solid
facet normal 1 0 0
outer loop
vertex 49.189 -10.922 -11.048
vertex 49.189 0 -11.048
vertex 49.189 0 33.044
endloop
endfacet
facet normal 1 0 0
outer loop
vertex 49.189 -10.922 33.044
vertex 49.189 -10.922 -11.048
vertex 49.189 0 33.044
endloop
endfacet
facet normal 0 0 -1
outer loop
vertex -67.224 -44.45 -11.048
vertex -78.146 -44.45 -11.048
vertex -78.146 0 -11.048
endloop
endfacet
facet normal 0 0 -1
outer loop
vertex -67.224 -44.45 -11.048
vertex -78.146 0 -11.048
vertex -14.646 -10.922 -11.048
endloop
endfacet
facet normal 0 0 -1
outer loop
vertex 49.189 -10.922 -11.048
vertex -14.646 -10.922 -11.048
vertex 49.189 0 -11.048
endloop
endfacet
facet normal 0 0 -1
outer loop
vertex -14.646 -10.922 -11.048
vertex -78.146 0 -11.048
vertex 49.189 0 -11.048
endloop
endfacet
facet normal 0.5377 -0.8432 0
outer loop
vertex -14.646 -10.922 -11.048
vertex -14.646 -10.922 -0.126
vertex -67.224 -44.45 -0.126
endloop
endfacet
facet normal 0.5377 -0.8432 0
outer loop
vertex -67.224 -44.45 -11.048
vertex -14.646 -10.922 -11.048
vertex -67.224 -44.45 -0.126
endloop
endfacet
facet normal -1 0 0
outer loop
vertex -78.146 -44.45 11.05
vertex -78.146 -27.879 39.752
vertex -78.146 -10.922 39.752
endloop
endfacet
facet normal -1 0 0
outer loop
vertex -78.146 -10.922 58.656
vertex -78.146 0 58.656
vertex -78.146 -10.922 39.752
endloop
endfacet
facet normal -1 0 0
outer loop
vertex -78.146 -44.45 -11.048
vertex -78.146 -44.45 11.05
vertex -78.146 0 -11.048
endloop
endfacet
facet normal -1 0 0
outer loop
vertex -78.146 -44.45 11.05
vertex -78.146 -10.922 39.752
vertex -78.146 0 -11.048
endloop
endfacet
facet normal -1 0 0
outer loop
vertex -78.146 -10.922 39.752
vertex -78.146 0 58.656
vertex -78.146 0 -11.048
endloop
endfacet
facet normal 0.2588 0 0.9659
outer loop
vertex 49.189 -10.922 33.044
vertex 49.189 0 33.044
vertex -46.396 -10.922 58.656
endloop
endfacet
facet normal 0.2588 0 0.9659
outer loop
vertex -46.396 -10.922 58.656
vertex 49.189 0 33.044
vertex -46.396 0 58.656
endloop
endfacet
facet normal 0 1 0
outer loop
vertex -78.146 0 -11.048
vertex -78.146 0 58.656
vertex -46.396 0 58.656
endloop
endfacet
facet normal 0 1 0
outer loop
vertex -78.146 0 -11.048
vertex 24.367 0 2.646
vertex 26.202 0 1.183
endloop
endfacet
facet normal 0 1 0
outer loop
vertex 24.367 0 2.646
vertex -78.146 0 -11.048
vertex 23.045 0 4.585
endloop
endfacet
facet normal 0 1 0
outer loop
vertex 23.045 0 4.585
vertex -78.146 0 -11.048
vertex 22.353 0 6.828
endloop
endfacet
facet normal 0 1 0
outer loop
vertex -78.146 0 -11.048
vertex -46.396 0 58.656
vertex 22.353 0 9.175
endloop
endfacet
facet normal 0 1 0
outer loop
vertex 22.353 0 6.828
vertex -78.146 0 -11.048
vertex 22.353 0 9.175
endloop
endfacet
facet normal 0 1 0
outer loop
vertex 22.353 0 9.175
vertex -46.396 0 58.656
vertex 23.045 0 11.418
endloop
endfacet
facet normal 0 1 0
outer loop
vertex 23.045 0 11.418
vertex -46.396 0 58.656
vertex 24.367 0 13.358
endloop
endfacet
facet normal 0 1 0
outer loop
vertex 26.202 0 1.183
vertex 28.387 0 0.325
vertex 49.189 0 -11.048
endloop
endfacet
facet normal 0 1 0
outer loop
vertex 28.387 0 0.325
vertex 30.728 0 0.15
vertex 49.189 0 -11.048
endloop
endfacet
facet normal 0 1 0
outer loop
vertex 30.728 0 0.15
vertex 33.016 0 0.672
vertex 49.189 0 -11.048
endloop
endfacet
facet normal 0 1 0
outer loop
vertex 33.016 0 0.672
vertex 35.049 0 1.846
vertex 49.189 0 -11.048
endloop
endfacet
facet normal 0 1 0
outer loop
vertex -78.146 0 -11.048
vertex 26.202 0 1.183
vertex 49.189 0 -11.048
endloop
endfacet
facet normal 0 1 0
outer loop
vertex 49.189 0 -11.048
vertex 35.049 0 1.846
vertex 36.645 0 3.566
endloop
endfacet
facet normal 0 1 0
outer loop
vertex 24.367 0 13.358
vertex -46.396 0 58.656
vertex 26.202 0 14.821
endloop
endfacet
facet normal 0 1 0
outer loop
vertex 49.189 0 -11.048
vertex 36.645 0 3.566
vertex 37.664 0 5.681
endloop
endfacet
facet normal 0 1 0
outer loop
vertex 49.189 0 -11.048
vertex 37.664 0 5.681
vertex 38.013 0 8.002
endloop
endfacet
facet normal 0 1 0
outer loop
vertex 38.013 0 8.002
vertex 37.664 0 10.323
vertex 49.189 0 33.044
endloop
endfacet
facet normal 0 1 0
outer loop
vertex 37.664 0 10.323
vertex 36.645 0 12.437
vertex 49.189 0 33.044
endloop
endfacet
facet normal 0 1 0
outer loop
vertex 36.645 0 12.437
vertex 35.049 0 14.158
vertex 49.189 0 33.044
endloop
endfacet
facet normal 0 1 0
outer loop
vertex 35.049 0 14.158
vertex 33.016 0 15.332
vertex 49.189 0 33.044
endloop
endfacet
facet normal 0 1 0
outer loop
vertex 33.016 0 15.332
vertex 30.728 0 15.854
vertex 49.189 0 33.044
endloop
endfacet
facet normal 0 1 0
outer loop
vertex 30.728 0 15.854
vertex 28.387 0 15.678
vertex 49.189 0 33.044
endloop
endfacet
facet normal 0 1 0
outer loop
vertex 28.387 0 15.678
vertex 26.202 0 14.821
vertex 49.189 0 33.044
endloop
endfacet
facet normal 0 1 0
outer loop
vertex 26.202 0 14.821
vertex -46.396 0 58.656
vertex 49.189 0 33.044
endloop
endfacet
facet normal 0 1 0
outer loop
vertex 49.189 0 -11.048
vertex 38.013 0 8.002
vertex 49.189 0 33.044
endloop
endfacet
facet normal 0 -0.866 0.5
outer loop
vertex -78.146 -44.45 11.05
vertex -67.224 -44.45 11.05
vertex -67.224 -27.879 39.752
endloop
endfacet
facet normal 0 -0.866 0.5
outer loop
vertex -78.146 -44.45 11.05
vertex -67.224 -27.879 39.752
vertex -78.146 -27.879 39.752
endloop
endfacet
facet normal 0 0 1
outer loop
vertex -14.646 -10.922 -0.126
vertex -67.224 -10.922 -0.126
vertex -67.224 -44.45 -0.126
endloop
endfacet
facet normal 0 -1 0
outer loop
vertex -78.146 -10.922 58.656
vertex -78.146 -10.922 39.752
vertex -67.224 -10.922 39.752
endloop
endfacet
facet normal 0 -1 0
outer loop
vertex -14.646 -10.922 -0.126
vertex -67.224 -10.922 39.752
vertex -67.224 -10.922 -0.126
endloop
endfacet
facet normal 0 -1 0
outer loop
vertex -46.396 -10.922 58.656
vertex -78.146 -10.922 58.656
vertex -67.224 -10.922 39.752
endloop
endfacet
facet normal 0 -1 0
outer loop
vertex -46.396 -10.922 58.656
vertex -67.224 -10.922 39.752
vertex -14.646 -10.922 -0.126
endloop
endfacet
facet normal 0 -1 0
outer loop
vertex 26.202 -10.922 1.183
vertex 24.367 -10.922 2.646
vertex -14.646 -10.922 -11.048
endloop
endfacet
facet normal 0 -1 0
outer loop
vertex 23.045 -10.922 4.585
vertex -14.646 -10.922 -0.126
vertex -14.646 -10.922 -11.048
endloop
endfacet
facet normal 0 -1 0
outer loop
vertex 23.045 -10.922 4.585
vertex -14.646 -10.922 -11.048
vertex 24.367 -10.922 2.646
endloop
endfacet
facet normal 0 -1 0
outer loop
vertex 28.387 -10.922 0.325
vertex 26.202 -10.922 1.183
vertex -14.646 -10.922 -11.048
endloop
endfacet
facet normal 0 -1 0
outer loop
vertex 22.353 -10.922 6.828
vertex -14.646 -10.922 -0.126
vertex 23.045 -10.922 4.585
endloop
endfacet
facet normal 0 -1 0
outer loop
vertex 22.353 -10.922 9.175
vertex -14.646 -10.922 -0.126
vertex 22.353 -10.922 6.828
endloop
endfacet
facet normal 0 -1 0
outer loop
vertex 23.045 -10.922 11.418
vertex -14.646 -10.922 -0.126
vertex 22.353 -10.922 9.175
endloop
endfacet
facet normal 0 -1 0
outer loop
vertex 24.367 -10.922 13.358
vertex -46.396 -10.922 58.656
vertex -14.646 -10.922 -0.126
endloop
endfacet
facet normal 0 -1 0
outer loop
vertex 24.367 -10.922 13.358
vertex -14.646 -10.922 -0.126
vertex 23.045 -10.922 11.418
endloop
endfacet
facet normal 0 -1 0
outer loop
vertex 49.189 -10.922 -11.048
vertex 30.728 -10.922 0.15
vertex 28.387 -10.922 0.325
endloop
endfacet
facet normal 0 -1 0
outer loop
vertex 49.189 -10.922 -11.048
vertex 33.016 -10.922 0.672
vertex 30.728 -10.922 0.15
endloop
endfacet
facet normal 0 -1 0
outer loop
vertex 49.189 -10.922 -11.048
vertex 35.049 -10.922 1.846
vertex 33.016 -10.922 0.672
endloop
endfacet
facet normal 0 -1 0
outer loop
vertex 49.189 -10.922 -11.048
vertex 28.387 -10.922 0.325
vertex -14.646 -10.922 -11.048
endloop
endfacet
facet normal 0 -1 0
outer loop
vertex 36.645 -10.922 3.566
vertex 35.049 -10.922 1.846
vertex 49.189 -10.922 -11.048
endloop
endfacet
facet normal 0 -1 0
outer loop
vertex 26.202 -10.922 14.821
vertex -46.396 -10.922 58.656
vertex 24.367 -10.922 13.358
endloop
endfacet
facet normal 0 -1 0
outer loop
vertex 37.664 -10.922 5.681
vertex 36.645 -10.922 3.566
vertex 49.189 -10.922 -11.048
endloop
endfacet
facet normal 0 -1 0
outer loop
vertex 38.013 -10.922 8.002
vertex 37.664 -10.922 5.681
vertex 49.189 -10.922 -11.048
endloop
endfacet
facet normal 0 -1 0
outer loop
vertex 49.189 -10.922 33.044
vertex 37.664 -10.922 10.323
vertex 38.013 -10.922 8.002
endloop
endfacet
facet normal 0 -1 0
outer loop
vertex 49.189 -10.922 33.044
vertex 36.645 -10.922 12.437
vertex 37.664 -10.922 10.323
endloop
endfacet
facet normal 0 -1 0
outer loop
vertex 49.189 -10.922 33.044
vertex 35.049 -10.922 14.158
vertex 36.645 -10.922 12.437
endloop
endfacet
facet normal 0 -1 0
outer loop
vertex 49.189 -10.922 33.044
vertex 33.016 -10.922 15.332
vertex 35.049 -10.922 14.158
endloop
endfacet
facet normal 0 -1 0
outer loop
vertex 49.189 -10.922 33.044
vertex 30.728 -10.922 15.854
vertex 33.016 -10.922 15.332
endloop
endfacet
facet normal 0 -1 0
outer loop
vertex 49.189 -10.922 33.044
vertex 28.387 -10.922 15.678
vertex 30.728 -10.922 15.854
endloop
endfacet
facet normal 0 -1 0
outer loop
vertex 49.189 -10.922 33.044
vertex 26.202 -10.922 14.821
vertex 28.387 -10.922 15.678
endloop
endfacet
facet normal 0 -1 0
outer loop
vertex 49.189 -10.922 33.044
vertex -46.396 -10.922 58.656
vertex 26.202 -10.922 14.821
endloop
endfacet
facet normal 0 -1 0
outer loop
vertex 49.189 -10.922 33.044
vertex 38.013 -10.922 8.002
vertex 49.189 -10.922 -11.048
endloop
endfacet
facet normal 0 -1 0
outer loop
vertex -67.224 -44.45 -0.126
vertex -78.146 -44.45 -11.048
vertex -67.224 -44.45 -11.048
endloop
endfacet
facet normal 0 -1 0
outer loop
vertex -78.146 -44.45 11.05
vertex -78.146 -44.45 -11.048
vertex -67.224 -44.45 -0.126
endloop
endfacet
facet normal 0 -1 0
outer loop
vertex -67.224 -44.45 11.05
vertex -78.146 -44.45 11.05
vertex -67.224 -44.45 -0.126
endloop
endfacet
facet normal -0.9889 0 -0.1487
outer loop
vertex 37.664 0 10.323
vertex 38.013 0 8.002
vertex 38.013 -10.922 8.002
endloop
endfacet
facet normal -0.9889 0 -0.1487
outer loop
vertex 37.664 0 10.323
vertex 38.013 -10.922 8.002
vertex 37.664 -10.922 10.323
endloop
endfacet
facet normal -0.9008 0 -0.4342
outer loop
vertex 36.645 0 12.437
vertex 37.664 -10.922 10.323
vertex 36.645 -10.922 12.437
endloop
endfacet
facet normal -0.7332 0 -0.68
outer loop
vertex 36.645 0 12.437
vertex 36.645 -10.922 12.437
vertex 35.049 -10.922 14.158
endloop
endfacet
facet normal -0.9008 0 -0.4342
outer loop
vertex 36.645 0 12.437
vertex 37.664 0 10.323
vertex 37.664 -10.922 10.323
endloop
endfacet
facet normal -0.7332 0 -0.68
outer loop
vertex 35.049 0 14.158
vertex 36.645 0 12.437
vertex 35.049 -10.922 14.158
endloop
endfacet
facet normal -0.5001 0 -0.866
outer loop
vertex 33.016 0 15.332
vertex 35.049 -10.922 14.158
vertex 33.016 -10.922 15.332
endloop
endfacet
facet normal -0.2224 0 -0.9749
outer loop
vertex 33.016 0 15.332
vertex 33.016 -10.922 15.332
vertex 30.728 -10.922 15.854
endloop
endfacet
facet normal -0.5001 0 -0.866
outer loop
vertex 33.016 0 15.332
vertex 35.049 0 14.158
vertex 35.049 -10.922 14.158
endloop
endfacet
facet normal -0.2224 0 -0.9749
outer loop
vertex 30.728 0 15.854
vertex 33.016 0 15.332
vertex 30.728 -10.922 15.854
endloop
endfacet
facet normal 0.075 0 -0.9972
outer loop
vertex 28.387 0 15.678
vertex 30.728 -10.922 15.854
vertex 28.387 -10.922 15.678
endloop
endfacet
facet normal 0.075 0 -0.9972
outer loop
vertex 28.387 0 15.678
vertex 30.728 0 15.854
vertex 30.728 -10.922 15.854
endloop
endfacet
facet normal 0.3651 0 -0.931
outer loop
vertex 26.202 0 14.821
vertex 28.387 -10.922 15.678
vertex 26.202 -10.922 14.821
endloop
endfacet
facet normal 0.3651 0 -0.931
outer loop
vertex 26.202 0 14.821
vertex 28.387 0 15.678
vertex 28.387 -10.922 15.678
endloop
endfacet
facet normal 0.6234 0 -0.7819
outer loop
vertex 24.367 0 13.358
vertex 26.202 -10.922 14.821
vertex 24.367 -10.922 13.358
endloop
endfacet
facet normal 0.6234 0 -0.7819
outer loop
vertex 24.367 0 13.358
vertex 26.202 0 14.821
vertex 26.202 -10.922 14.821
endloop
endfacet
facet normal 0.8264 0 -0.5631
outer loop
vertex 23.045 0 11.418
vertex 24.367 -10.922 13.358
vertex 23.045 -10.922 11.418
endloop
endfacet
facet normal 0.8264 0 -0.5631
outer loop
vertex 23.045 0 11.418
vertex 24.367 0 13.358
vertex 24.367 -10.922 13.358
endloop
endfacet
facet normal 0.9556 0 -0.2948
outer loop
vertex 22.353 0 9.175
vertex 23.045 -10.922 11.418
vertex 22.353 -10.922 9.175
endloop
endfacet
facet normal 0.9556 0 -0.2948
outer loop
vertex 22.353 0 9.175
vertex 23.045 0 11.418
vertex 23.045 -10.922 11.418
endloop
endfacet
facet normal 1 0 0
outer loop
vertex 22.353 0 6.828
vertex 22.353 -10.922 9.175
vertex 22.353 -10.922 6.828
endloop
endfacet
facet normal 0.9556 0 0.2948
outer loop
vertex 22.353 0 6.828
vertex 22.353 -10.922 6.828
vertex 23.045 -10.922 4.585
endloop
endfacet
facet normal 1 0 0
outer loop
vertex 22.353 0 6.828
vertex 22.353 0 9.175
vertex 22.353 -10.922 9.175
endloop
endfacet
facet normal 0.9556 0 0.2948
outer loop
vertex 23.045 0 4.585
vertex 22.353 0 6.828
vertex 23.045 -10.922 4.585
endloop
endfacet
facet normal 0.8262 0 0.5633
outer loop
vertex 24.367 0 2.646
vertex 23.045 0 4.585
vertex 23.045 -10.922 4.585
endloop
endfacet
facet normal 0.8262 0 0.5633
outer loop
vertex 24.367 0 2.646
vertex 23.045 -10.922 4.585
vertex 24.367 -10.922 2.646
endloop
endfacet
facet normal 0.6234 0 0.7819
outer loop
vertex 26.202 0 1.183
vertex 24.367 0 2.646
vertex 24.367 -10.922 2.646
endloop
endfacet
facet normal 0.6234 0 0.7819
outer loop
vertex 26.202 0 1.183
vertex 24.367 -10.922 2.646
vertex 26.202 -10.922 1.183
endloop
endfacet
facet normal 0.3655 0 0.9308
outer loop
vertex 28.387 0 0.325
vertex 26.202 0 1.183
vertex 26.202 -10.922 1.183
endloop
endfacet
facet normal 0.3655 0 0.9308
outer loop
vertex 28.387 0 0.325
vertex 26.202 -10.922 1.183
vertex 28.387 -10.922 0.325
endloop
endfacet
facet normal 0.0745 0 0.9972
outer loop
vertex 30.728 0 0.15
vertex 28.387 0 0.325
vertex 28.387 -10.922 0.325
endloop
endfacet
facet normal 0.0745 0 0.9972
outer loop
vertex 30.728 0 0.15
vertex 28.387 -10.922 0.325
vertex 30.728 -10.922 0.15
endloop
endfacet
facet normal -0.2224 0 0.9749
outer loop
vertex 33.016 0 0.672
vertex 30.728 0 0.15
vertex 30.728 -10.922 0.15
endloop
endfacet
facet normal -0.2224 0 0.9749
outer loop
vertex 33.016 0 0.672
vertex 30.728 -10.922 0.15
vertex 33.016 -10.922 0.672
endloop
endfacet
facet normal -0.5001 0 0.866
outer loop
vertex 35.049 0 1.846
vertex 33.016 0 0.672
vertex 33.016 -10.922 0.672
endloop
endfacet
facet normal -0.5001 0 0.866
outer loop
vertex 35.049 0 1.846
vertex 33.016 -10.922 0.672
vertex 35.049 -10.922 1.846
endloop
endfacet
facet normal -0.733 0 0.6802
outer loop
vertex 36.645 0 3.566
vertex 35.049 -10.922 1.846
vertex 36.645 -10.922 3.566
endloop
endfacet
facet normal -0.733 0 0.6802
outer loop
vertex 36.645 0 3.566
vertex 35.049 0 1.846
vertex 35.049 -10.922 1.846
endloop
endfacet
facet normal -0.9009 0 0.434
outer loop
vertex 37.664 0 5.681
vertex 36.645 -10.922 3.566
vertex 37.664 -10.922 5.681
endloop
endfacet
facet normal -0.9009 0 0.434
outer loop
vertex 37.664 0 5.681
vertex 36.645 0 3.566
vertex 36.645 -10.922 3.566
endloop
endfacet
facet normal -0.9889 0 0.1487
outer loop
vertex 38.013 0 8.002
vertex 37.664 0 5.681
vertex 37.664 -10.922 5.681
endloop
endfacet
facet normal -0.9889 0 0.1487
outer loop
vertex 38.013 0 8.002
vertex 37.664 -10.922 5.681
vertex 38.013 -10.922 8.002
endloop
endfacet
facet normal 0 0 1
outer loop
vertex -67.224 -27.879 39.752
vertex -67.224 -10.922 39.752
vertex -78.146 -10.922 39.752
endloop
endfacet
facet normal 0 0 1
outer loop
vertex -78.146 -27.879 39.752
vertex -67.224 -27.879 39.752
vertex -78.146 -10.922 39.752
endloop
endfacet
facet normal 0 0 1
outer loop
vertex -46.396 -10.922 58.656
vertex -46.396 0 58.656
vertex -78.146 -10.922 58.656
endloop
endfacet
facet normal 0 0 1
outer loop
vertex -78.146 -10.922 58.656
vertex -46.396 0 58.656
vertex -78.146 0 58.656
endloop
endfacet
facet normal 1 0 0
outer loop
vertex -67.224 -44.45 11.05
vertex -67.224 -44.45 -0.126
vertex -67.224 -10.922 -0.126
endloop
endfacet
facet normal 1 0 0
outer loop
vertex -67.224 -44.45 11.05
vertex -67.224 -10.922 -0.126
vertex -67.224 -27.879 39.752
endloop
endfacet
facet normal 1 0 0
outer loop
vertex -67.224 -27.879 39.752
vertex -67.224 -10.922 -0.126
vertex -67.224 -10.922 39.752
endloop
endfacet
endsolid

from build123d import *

# Parameters (mm, degrees)
F0_R     = 7.874
F1_DEPTH = 10.922
F2_W     = 52.578
F2_H     = 10.922
F3_DEPTH = 33.528
F4_SIZE2 = 16.5711074263
F4_SIZE  = 28.702
F6_DEPTH = 10.923


with BuildPart() as f1:
    # F0 (on Front) → F1 (new body)
    with BuildSketch(Plane.XZ):
        Polygon((-46.3958915723, 58.6556293481), (-78.1458915723, 58.6556293481), (-78.1458915723, -11.0481244944), (49.1894248783, -11.0481244944), (49.1894248783, 33.0436209969), align=None)
        with Locations((30.1394248783, 8.0018755056)):
            Circle(F0_R, mode=Mode.SUBTRACT)
    extrude(amount=F1_DEPTH)

    # F2 (on face) → F3 (join)
    with BuildSketch(Plane.XZ.offset(10.922)):
        Polygon((-67.2238915723, 39.7518755056), (-78.1458915723, 39.7518755056), (-78.1458915723, -11.0481244944), (-67.2238915723, -11.0481244944), (-67.2238915723, -0.1261244944), align=None)
        with Locations((-40.9348915723, -5.5871244944)):
            Rectangle(F2_W, F2_H)
    extrude(amount=F3_DEPTH)

    # F4
    f4_edges = [f1.edges().sort_by_distance(p)[0] for p in [
        (-72.684892, -44.45, 39.751876),
    ]]
    f4_side = f1.faces().sort_by_distance((-68.037088, -44.45, 19.812876))[0]
    chamfer(f4_edges, length=F4_SIZE, length2=F4_SIZE2, reference=f4_side)

    # F5 (on face) → F6 (cut, through all)
    with BuildSketch(Plane.XY.offset(-0.1261244944)):
        Polygon((-14.6458915723, -10.922), (-67.2238915723, -44.45), (-14.6458915723, -44.45), align=None)
    extrude(amount=-F6_DEPTH, mode=Mode.SUBTRACT)


solid = f1.part
